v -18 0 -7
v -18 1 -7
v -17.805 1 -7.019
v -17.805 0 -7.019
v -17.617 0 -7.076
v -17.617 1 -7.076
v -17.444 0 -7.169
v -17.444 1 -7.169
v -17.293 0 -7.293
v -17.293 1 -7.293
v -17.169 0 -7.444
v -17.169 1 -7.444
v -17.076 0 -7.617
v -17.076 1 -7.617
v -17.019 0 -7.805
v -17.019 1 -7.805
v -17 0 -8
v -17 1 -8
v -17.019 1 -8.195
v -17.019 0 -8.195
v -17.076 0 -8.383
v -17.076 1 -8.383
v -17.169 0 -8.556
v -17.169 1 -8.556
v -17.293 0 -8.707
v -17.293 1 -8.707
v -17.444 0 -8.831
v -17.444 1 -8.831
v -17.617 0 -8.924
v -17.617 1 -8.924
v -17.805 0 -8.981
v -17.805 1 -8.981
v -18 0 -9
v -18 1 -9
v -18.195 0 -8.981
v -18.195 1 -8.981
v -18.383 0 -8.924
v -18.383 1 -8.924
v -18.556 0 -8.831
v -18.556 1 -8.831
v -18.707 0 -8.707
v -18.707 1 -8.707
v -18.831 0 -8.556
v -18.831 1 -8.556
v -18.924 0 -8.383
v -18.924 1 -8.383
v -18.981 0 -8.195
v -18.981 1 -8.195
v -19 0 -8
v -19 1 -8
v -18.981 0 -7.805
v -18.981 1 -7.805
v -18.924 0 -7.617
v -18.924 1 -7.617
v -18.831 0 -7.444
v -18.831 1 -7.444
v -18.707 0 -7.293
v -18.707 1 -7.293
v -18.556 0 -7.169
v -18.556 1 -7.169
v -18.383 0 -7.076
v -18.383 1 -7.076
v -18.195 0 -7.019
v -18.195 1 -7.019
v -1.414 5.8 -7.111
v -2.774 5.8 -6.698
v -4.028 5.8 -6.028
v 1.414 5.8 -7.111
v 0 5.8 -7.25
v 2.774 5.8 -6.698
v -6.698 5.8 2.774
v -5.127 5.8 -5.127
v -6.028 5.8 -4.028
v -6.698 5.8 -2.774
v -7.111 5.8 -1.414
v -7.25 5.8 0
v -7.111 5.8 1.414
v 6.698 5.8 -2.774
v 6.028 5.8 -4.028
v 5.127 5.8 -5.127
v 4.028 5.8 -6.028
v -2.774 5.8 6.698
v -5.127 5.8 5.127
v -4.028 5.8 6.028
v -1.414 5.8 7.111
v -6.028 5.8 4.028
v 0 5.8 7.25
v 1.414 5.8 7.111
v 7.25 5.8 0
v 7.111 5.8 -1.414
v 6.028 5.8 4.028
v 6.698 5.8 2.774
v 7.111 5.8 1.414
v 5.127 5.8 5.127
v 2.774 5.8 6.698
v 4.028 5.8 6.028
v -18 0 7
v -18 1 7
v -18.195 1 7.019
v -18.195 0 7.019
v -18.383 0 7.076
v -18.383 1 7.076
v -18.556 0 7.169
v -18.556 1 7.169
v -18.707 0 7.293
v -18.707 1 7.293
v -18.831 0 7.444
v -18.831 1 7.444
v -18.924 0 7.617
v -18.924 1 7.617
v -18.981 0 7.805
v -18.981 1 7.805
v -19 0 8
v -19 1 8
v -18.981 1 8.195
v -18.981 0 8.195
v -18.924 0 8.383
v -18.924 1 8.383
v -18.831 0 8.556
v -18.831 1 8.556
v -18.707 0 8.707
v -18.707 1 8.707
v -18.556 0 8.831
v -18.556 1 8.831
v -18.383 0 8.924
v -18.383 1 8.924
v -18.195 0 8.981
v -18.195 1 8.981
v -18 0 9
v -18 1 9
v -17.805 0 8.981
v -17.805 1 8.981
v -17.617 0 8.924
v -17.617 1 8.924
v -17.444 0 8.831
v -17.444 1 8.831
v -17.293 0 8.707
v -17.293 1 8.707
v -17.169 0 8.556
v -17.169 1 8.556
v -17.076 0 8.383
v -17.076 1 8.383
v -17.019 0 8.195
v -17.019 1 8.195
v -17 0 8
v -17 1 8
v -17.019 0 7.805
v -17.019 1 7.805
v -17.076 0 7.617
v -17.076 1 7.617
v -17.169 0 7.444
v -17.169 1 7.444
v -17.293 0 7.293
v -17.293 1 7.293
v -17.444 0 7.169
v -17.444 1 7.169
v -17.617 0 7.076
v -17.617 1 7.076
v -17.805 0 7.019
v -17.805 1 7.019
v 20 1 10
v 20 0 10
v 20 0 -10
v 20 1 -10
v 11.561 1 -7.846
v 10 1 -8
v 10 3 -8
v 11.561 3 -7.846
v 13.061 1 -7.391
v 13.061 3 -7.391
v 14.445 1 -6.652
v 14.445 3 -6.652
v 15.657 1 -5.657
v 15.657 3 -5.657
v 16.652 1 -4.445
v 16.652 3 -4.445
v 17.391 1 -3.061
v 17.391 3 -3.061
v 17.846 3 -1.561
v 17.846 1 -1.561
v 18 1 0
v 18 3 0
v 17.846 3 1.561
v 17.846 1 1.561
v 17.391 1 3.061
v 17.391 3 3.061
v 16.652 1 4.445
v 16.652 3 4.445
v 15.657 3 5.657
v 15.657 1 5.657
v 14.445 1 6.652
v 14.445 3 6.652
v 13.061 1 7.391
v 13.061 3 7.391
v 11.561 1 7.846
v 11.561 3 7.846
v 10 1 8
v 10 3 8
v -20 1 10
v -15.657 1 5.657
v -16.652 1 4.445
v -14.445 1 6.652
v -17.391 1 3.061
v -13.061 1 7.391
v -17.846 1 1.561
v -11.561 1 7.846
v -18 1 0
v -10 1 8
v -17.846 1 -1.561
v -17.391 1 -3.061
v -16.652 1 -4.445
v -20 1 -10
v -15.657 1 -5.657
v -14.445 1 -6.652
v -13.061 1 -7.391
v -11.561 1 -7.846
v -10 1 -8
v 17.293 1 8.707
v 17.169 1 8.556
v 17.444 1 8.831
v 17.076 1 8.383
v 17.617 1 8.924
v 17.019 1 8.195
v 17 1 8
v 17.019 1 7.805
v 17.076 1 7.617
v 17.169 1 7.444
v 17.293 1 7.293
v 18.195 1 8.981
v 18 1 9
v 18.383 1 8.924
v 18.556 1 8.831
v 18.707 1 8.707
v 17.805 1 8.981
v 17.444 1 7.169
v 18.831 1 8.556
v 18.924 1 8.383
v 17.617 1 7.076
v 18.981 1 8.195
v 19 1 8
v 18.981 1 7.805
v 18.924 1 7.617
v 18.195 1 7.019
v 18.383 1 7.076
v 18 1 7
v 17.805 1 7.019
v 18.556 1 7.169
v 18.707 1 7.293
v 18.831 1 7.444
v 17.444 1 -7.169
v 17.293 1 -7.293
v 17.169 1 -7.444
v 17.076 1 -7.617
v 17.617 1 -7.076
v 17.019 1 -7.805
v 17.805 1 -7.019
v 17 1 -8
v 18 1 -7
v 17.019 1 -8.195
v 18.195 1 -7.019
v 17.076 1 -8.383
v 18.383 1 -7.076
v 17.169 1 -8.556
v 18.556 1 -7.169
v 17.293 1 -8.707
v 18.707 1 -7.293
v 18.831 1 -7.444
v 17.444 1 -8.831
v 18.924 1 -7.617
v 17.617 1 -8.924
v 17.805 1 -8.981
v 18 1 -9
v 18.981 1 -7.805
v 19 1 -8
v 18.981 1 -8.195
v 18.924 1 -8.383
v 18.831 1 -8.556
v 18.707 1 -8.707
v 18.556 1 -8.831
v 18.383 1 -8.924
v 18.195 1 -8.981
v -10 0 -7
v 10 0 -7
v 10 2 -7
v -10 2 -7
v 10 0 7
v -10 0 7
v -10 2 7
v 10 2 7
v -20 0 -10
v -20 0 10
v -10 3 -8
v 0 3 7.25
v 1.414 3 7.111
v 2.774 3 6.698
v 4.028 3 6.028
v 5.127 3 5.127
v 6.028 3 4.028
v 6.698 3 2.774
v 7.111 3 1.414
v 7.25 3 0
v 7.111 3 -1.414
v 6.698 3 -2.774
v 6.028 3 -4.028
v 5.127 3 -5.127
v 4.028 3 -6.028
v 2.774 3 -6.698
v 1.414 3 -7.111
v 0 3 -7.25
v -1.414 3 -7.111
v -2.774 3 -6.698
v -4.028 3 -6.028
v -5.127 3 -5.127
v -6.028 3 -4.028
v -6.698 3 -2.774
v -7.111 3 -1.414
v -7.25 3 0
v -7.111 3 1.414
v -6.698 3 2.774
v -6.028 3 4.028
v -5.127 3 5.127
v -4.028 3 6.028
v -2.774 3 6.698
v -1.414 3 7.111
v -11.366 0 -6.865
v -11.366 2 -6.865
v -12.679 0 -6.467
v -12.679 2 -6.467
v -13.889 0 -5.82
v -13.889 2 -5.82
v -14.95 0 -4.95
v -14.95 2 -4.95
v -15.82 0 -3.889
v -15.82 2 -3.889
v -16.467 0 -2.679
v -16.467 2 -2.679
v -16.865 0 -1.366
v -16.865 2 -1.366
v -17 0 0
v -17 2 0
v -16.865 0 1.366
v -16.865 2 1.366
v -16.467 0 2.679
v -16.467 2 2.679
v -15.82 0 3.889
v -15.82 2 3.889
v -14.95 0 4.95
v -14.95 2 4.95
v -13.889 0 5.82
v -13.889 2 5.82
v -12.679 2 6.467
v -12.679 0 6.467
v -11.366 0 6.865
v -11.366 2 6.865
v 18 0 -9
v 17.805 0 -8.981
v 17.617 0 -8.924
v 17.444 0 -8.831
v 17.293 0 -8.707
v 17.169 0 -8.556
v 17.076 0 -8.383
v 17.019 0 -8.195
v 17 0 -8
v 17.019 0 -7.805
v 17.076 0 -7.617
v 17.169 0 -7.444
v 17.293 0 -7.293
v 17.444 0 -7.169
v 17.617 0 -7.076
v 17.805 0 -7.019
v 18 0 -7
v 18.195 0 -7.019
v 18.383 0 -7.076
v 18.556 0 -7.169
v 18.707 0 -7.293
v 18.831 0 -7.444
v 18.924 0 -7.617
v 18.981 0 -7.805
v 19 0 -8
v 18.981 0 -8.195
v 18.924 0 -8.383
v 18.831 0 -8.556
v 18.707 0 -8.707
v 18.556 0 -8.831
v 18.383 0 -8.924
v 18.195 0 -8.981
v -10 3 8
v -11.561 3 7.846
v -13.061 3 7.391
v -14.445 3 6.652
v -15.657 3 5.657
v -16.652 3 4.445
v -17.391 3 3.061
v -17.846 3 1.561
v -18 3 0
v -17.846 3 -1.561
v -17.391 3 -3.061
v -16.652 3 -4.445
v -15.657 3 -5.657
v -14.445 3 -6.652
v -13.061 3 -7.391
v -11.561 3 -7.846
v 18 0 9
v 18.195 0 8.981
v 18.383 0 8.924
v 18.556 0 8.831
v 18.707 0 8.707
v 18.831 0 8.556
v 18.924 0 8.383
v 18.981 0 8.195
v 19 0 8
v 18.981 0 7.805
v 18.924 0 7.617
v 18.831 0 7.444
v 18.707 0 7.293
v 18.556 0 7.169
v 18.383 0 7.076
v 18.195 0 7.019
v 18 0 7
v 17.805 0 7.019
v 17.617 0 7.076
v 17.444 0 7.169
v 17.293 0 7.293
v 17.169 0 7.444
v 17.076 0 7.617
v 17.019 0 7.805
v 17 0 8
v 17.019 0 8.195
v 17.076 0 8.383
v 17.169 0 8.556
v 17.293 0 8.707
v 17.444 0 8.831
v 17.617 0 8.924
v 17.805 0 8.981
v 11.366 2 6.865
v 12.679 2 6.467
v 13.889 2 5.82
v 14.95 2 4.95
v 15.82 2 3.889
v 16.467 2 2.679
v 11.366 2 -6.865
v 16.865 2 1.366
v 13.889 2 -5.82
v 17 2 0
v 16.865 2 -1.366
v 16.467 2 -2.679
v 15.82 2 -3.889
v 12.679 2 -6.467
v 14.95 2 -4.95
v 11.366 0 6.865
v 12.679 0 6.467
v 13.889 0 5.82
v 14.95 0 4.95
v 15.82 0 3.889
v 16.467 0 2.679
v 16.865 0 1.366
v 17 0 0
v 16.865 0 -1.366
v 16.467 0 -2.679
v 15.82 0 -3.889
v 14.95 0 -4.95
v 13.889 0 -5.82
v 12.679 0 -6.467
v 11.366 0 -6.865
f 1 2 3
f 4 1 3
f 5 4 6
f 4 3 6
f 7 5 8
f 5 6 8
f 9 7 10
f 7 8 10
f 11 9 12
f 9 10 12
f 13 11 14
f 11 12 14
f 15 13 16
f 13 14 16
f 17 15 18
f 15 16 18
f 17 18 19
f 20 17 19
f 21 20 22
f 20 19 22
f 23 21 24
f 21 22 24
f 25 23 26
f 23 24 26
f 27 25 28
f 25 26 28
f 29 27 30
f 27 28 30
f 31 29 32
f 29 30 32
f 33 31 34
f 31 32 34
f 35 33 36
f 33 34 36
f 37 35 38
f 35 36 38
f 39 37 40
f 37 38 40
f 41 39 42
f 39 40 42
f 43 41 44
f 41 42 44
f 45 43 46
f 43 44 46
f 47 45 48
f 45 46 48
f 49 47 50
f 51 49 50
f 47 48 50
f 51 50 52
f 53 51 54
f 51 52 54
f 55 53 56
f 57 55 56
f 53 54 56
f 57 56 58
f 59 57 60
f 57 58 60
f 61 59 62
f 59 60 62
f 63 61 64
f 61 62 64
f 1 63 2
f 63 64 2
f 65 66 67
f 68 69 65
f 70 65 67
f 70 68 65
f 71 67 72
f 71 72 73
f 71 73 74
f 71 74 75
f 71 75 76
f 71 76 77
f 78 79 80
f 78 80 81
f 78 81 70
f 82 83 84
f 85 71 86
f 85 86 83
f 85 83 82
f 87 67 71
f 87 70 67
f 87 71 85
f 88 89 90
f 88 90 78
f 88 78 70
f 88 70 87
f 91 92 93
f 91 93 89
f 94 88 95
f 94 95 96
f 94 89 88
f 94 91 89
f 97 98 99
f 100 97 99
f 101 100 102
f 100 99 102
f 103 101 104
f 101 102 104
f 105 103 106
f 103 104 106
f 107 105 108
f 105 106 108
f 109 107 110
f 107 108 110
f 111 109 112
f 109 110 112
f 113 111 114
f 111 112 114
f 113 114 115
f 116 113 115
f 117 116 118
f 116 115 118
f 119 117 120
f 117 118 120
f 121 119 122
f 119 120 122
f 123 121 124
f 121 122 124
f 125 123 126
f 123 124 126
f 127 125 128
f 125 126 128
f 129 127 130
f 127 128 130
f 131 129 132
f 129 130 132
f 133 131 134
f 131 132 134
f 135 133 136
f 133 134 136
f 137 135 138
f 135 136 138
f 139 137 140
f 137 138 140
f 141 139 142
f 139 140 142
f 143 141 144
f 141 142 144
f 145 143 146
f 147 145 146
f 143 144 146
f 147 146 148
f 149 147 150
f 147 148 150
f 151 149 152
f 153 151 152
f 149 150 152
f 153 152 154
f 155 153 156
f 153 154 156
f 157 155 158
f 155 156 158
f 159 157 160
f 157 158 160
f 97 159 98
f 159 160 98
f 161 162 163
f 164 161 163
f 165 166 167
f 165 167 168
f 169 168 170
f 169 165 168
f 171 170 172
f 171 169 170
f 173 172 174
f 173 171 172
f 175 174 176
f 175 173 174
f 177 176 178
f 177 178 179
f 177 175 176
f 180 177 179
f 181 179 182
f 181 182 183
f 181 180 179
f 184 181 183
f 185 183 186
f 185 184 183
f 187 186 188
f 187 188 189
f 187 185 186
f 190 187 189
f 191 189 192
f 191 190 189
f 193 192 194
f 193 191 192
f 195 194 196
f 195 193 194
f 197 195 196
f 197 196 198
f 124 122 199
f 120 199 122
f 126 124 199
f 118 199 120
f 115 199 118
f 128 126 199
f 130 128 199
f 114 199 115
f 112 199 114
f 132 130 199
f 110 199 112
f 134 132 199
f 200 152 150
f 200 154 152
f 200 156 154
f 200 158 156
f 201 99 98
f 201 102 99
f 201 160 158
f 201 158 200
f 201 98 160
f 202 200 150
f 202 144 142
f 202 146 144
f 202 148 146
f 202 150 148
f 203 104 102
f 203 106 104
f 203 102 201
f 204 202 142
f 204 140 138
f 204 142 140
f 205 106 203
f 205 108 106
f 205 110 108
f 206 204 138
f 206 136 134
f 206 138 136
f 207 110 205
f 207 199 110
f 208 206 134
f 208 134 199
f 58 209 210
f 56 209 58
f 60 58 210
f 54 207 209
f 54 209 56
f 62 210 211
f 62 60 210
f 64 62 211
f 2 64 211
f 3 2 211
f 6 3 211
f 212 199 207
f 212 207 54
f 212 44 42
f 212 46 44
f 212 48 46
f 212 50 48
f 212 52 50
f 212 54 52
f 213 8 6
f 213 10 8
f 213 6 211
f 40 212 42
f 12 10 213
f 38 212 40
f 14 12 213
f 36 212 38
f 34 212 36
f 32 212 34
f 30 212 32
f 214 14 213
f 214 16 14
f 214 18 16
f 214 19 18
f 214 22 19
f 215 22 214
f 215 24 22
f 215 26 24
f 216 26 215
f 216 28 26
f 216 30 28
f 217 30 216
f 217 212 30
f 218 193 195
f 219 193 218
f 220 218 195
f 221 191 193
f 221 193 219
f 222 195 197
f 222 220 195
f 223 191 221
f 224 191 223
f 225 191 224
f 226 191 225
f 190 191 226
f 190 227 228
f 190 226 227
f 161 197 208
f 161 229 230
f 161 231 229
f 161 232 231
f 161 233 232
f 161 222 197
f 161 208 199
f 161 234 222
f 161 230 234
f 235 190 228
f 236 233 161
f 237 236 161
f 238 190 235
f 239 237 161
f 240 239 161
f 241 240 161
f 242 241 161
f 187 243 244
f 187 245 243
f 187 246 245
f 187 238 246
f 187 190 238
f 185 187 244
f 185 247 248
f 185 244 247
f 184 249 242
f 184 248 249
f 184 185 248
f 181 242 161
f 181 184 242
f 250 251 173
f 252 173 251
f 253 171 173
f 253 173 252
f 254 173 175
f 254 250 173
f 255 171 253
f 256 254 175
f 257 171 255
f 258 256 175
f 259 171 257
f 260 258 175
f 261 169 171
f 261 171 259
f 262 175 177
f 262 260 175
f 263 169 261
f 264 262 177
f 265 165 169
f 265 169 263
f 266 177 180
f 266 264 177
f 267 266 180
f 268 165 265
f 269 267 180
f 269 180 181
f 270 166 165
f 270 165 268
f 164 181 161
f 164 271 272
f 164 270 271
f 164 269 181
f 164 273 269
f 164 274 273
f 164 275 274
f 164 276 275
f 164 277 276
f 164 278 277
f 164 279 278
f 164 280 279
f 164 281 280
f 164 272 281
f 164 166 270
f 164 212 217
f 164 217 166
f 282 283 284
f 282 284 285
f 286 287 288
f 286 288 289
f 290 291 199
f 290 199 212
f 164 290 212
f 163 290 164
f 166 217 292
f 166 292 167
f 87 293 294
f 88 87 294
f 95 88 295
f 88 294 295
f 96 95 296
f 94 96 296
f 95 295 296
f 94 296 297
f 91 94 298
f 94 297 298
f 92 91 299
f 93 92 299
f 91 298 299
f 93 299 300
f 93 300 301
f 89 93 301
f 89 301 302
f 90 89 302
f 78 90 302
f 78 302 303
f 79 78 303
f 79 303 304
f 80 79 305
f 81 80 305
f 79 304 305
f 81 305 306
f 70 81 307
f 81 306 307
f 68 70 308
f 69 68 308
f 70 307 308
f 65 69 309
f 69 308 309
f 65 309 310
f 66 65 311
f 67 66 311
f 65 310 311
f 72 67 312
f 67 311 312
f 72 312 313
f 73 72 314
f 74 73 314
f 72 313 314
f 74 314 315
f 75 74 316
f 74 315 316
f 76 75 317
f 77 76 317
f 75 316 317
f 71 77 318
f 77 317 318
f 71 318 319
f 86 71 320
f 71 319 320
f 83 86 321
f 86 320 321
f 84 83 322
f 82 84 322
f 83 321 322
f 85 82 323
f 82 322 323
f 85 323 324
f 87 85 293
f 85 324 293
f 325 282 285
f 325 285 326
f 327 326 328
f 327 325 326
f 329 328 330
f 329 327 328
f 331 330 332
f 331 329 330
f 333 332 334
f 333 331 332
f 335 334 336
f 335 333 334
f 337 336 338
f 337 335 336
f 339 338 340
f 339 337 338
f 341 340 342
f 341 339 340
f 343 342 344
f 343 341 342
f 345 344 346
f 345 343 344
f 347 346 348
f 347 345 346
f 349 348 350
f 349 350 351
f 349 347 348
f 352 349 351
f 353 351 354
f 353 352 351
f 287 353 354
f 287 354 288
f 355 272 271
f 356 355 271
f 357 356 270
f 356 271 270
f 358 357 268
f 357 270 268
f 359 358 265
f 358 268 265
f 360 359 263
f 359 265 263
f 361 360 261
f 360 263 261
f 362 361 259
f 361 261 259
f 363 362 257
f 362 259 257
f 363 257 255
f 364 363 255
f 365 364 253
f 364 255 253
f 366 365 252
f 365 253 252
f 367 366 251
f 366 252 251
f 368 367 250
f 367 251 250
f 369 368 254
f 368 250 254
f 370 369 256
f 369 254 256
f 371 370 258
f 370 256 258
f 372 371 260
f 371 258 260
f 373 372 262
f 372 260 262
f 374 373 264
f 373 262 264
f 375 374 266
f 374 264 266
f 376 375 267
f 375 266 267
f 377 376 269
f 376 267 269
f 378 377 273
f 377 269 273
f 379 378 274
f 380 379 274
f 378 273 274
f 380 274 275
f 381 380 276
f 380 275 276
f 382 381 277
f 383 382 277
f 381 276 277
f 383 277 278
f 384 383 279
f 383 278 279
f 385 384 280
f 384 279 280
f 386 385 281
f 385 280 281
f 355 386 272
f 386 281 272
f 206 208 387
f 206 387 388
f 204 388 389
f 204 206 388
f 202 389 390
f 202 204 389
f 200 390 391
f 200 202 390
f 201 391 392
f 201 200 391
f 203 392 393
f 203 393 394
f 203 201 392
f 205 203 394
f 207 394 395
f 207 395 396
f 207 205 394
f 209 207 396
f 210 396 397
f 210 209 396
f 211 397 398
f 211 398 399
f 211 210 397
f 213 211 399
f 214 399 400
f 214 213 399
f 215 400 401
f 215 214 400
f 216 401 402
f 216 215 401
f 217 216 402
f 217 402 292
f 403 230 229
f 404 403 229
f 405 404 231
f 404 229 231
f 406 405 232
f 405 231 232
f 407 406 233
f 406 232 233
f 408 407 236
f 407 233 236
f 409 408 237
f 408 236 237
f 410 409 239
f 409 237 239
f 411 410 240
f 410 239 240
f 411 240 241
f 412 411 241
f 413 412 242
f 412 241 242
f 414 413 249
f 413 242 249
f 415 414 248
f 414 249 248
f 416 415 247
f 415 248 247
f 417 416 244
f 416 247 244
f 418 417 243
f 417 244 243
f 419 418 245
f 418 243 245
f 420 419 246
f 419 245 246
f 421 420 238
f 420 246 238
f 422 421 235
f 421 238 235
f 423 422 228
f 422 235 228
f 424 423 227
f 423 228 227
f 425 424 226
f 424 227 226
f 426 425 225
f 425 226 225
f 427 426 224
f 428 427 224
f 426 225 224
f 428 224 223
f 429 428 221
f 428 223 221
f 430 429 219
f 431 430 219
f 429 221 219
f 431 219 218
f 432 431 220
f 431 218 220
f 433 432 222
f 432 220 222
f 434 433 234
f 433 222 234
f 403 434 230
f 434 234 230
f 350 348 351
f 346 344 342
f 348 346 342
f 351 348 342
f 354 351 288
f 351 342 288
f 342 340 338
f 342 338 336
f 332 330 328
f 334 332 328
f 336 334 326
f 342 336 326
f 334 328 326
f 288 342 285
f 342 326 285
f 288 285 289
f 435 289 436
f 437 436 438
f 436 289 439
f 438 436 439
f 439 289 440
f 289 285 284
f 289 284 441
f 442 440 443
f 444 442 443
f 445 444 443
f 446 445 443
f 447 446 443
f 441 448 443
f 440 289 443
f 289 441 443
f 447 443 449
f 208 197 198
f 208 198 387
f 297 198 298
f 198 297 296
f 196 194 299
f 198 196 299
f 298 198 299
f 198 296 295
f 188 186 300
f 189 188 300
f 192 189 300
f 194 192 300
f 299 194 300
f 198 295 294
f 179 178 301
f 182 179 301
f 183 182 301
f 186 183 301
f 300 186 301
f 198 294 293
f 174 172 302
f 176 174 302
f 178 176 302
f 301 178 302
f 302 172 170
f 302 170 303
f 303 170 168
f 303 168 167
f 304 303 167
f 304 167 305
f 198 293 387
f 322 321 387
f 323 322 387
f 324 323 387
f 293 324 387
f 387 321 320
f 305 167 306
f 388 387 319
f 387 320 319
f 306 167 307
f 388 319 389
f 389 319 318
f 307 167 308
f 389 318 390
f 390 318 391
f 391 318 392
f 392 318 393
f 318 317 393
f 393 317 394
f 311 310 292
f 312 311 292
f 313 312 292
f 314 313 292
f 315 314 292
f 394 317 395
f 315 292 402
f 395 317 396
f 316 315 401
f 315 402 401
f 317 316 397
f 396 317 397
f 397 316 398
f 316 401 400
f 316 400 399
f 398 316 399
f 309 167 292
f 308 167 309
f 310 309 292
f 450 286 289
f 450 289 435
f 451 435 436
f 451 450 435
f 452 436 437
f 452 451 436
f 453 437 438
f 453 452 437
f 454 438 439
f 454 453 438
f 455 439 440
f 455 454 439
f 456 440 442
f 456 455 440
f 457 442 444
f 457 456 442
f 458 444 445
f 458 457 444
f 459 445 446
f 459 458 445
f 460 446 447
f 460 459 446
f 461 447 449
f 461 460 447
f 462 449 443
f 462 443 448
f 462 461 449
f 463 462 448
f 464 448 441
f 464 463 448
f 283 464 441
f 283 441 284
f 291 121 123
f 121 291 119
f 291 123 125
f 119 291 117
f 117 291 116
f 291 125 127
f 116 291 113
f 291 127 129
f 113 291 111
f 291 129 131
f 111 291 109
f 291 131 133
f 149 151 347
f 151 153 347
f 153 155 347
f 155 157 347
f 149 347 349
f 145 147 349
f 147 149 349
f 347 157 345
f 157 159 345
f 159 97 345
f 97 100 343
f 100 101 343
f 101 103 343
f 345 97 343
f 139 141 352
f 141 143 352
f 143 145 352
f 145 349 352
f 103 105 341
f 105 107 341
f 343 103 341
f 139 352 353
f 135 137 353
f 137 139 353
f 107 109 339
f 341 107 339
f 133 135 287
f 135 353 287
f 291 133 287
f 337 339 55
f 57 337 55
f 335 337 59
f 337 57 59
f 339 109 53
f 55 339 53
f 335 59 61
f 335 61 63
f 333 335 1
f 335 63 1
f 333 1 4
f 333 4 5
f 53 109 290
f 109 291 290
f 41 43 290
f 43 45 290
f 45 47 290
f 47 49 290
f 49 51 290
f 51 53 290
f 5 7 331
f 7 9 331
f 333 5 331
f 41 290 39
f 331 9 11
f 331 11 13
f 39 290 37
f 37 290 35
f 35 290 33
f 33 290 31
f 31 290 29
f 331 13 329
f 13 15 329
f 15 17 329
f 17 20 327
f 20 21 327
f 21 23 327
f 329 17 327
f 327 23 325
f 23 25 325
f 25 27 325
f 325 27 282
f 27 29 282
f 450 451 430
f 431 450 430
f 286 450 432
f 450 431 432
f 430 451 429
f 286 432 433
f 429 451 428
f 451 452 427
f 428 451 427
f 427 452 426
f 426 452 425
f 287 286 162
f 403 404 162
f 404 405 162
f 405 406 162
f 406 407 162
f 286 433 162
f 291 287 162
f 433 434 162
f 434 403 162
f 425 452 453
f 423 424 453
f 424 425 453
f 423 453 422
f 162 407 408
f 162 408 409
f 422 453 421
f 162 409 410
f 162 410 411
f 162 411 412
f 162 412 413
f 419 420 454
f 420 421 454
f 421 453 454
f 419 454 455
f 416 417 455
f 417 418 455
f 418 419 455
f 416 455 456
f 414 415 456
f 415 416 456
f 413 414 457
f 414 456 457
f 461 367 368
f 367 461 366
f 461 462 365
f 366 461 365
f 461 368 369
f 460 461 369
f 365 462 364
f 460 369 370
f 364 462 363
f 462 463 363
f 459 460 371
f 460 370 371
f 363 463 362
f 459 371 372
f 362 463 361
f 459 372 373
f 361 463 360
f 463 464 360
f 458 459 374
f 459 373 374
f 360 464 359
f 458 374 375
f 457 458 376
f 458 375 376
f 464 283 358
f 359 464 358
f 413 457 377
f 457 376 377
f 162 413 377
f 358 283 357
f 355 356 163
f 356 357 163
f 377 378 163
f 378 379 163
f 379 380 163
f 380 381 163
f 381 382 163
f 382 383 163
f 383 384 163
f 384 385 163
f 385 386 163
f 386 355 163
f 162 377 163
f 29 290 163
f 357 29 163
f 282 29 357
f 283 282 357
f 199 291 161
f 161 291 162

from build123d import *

# Parameters (mm, degrees)
SKETCH_1_W          = 40
SKETCH_1_H          = 20
EXTRUDE_1_DEPTH     = 1
SKETCH_2_R          = 1
CUT_EXTRUDE_1_DEPTH = 1
EXTRUDE_2_DEPTH     = 2
SHELL_2_DEPTH       = 2
SKETCH_4_R          = 7.25
EXTRUDE_3_DEPTH     = 2.8


# Read off the part's stored shape, not the designer's step: 抽壳2
with BuildPart() as part:
    # 草图1 → 凸台-拉伸1 (new body)
    with BuildSketch(Plane(origin=(0, 0, 0), x_dir=(1, 0, 0), z_dir=(0, 1, 0))):
        Rectangle(SKETCH_1_W, SKETCH_1_H)
    extrude(amount=EXTRUDE_1_DEPTH)

    # 草图2 → 切除-拉伸1 (cut)
    with BuildSketch(Plane(origin=(0, 1, 0), x_dir=(1, 0, 0), z_dir=(0, 1, 0))):
        with Locations(Location((-18, 8, 0), (0, 0, 270))):
            Circle(SKETCH_2_R)
        with Locations(Location((18, 8, 0), (0, 0, 90))):
            Circle(SKETCH_2_R)
        with Locations(Location((18, -8, 0), (0, 0, 270))):
            Circle(SKETCH_2_R)
        with Locations(Location((-18, -8, 0), (0, 0, 90))):
            Circle(SKETCH_2_R)
    extrude(amount=-CUT_EXTRUDE_1_DEPTH, mode=Mode.SUBTRACT)

    # 草图3 → 凸台-拉伸2 (add)
    with BuildSketch(Plane(origin=(0, 1, 0), x_dir=(1, 0, 0), z_dir=(0, 1, 0))):
        with BuildLine():
            Line((-10, 8), (10, 8))
            ThreePointArc((10, 8), (18, 0), (10, -8))
            Line((10, -8), (-10, -8))
            ThreePointArc((-10, -8), (-18, 0), (-10, 8))
        make_face()
    extrude(amount=EXTRUDE_2_DEPTH)

    # 抽壳2 outline → 抽壳2 (cut)
    with BuildSketch(Plane(origin=(0, 0, 0), x_dir=(1, 0, 0), z_dir=(0, 1, 0))):
        with BuildLine():
            ThreePointArc((-10, 7), (-17, 0), (-10, -7))
            Line((-10, -7), (10, -7))
            ThreePointArc((10, -7), (17, 0), (10, 7))
            Line((10, 7), (-10, 7))
        make_face()
    extrude(amount=SHELL_2_DEPTH, mode=Mode.SUBTRACT)

    # 草图4 → 凸台-拉伸3 (add)
    with BuildSketch(Plane(origin=(0, 3, 0), x_dir=(1, 0, 0), z_dir=(0, 1, 0))):
        with Locations(Location((0, 0, 0), (0, 0, 270))):
            Circle(SKETCH_4_R)
    extrude(amount=EXTRUDE_3_DEPTH)


solid = part.part
